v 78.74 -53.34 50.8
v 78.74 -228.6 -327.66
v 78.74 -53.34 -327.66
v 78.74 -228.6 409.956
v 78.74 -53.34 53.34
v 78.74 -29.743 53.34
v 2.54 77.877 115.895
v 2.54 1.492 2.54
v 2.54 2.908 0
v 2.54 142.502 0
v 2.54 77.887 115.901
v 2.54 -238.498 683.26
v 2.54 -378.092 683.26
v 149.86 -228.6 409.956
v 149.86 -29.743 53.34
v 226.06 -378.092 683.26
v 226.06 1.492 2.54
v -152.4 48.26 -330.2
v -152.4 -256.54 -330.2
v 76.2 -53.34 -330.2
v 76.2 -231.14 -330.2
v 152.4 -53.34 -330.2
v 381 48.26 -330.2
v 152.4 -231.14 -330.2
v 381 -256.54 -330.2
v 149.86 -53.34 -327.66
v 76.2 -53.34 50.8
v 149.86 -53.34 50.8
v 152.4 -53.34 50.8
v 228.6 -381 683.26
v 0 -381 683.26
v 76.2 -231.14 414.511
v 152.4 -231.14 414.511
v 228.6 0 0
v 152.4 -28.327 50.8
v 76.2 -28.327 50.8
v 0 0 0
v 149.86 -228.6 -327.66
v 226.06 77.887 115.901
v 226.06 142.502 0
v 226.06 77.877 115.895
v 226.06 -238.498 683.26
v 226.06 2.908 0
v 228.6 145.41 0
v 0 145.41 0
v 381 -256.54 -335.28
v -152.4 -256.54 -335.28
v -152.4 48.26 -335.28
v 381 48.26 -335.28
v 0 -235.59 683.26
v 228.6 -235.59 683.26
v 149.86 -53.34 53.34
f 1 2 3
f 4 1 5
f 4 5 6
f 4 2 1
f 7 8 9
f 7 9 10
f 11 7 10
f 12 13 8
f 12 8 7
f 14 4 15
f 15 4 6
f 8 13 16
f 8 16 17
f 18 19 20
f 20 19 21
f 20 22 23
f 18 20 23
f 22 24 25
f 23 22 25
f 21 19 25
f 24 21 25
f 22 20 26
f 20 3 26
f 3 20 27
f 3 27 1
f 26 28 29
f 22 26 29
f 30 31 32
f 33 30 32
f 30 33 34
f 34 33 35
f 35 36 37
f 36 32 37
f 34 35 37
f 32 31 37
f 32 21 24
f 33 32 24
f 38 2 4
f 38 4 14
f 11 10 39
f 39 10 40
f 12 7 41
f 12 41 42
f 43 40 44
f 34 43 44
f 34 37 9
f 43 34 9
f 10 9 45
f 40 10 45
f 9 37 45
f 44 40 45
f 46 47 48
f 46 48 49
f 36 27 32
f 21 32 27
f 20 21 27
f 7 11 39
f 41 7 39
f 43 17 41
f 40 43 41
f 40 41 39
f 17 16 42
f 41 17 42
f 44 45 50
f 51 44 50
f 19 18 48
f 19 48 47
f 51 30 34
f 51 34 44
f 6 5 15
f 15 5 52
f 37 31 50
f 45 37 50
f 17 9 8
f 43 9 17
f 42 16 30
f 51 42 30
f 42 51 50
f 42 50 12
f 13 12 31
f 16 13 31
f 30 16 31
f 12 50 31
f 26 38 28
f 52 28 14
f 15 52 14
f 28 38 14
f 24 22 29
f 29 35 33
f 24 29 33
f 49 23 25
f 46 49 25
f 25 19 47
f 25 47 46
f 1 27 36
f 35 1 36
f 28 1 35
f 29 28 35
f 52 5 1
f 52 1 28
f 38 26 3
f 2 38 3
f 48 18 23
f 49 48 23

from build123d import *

# Parameters (mm, degrees)
F1_DEPTH   = 228.6
F2_T       = -2.54
F4_W       = 223.52
F4_H       = 121.926114556
F5_DEPTH   = 134.112
F7_W       = 76.2
F7_H       = 177.8
F9_W       = 76.2
F9_H       = 177.8
F10_DEPTH  = 381
F8_FACE1_W = 76.2
F8_FACE1_H = 103.6678810409
F13_T      = -2.54
F11_W      = 533.4
F11_H      = 304.8
F11_W_2    = 76.2
F11_H_2    = 177.8
F14_DEPTH  = 5.08


# Not quite as in the source:
# - a shell that OpenCascade refuses in one call is made with other operations: the cavity is built on its own and cut out
# - a feature names something its author has since deleted; it is built from what else it names


with BuildPart() as f1:
    # F0 (on Right) → F1 (new body)
    with BuildSketch(Plane.YZ):
        Polygon((-381, 683.26), (0, 0), (145.4103401064, 0), (-235.5896598936, 683.26), align=None)
    extrude(amount=F1_DEPTH)

    # F2
    f2_openings = [f1.faces().sort_by_distance(p)[0] for p in [
        (114.3, -308.29483, 683.26),
    ]]
    offset(amount=F2_T, openings=f2_openings)

    # F4 (on face) → F5 (cut)
    with BuildSketch(Plane(origin=(0, 34.4790739886, -61.8450267372), x_dir=(1, 0, 0), z_dir=(0, -0.4869452699, 0.873432484))):
        with Locations((114.3, 63.503057278)):
            Rectangle(F4_W, F4_H)
    extrude(amount=F5_DEPTH, mode=Mode.SUBTRACT)

    # F7 (on offset) → F8 (join, up to the next surface of F1)
    with BuildSketch(Plane.XZ.offset(231.14)):
        with Locations((114.3, 139.7)):
            Rectangle(F7_W, F7_H)
    extrude(until=Until.NEXT, dir=(0, 1, 0))

    # F9 (on face) → F10 (join)
    with BuildSketch(Plane(origin=(0, 0, 50.8), x_dir=(1, 0, 0), z_dir=(0, 0, -1))):
        with Locations((114.3, 142.24)):
            Rectangle(F9_W, F9_H)
    extrude(amount=F10_DEPTH)

    # F8_face1 (on face) → F12 (join, up to the next surface of F1)
    with BuildSketch(Plane(origin=(114.3, -179.3060594796, 228.6), x_dir=(1, 0, 0), z_dir=(0, 0, 1))):
        Rectangle(F8_FACE1_W, F8_FACE1_H)
    extrude(until=Until.NEXT)

    # F13: a shell. OpenCascade refuses it in one call, so the cavity is built on its own and cut out:
    # the body offset inwards by the wall thickness, plus a prism from it out through each open face.
    f13_core = offset(f1.part, amount=F13_T, kind=Kind.INTERSECTION, mode=Mode.PRIVATE)
    f13_exits = [f13_core.faces().sort_by_distance(p)[0] for p in [
        (114.3, -55.88, -137.16),
    ]]
    add(f13_core, mode=Mode.SUBTRACT)
    extrude(f13_exits, amount=-F13_T, mode=Mode.SUBTRACT)

    # F11 (on face) → F14 (join)
    with BuildSketch(Plane(origin=(0, 0, -330.2), x_dir=(1, 0, 0), z_dir=(0, 0, -1))):
        with Locations((114.3, 104.14)):
            Rectangle(F11_W, F11_H)
        with Locations((114.3, 142.24)):
            Rectangle(F11_W_2, F11_H_2, mode=Mode.SUBTRACT)
        with Locations((114.3, 142.24)):
            Rectangle(F11_W_2, F11_H_2)
    extrude(amount=F14_DEPTH)


solid = f1.part
